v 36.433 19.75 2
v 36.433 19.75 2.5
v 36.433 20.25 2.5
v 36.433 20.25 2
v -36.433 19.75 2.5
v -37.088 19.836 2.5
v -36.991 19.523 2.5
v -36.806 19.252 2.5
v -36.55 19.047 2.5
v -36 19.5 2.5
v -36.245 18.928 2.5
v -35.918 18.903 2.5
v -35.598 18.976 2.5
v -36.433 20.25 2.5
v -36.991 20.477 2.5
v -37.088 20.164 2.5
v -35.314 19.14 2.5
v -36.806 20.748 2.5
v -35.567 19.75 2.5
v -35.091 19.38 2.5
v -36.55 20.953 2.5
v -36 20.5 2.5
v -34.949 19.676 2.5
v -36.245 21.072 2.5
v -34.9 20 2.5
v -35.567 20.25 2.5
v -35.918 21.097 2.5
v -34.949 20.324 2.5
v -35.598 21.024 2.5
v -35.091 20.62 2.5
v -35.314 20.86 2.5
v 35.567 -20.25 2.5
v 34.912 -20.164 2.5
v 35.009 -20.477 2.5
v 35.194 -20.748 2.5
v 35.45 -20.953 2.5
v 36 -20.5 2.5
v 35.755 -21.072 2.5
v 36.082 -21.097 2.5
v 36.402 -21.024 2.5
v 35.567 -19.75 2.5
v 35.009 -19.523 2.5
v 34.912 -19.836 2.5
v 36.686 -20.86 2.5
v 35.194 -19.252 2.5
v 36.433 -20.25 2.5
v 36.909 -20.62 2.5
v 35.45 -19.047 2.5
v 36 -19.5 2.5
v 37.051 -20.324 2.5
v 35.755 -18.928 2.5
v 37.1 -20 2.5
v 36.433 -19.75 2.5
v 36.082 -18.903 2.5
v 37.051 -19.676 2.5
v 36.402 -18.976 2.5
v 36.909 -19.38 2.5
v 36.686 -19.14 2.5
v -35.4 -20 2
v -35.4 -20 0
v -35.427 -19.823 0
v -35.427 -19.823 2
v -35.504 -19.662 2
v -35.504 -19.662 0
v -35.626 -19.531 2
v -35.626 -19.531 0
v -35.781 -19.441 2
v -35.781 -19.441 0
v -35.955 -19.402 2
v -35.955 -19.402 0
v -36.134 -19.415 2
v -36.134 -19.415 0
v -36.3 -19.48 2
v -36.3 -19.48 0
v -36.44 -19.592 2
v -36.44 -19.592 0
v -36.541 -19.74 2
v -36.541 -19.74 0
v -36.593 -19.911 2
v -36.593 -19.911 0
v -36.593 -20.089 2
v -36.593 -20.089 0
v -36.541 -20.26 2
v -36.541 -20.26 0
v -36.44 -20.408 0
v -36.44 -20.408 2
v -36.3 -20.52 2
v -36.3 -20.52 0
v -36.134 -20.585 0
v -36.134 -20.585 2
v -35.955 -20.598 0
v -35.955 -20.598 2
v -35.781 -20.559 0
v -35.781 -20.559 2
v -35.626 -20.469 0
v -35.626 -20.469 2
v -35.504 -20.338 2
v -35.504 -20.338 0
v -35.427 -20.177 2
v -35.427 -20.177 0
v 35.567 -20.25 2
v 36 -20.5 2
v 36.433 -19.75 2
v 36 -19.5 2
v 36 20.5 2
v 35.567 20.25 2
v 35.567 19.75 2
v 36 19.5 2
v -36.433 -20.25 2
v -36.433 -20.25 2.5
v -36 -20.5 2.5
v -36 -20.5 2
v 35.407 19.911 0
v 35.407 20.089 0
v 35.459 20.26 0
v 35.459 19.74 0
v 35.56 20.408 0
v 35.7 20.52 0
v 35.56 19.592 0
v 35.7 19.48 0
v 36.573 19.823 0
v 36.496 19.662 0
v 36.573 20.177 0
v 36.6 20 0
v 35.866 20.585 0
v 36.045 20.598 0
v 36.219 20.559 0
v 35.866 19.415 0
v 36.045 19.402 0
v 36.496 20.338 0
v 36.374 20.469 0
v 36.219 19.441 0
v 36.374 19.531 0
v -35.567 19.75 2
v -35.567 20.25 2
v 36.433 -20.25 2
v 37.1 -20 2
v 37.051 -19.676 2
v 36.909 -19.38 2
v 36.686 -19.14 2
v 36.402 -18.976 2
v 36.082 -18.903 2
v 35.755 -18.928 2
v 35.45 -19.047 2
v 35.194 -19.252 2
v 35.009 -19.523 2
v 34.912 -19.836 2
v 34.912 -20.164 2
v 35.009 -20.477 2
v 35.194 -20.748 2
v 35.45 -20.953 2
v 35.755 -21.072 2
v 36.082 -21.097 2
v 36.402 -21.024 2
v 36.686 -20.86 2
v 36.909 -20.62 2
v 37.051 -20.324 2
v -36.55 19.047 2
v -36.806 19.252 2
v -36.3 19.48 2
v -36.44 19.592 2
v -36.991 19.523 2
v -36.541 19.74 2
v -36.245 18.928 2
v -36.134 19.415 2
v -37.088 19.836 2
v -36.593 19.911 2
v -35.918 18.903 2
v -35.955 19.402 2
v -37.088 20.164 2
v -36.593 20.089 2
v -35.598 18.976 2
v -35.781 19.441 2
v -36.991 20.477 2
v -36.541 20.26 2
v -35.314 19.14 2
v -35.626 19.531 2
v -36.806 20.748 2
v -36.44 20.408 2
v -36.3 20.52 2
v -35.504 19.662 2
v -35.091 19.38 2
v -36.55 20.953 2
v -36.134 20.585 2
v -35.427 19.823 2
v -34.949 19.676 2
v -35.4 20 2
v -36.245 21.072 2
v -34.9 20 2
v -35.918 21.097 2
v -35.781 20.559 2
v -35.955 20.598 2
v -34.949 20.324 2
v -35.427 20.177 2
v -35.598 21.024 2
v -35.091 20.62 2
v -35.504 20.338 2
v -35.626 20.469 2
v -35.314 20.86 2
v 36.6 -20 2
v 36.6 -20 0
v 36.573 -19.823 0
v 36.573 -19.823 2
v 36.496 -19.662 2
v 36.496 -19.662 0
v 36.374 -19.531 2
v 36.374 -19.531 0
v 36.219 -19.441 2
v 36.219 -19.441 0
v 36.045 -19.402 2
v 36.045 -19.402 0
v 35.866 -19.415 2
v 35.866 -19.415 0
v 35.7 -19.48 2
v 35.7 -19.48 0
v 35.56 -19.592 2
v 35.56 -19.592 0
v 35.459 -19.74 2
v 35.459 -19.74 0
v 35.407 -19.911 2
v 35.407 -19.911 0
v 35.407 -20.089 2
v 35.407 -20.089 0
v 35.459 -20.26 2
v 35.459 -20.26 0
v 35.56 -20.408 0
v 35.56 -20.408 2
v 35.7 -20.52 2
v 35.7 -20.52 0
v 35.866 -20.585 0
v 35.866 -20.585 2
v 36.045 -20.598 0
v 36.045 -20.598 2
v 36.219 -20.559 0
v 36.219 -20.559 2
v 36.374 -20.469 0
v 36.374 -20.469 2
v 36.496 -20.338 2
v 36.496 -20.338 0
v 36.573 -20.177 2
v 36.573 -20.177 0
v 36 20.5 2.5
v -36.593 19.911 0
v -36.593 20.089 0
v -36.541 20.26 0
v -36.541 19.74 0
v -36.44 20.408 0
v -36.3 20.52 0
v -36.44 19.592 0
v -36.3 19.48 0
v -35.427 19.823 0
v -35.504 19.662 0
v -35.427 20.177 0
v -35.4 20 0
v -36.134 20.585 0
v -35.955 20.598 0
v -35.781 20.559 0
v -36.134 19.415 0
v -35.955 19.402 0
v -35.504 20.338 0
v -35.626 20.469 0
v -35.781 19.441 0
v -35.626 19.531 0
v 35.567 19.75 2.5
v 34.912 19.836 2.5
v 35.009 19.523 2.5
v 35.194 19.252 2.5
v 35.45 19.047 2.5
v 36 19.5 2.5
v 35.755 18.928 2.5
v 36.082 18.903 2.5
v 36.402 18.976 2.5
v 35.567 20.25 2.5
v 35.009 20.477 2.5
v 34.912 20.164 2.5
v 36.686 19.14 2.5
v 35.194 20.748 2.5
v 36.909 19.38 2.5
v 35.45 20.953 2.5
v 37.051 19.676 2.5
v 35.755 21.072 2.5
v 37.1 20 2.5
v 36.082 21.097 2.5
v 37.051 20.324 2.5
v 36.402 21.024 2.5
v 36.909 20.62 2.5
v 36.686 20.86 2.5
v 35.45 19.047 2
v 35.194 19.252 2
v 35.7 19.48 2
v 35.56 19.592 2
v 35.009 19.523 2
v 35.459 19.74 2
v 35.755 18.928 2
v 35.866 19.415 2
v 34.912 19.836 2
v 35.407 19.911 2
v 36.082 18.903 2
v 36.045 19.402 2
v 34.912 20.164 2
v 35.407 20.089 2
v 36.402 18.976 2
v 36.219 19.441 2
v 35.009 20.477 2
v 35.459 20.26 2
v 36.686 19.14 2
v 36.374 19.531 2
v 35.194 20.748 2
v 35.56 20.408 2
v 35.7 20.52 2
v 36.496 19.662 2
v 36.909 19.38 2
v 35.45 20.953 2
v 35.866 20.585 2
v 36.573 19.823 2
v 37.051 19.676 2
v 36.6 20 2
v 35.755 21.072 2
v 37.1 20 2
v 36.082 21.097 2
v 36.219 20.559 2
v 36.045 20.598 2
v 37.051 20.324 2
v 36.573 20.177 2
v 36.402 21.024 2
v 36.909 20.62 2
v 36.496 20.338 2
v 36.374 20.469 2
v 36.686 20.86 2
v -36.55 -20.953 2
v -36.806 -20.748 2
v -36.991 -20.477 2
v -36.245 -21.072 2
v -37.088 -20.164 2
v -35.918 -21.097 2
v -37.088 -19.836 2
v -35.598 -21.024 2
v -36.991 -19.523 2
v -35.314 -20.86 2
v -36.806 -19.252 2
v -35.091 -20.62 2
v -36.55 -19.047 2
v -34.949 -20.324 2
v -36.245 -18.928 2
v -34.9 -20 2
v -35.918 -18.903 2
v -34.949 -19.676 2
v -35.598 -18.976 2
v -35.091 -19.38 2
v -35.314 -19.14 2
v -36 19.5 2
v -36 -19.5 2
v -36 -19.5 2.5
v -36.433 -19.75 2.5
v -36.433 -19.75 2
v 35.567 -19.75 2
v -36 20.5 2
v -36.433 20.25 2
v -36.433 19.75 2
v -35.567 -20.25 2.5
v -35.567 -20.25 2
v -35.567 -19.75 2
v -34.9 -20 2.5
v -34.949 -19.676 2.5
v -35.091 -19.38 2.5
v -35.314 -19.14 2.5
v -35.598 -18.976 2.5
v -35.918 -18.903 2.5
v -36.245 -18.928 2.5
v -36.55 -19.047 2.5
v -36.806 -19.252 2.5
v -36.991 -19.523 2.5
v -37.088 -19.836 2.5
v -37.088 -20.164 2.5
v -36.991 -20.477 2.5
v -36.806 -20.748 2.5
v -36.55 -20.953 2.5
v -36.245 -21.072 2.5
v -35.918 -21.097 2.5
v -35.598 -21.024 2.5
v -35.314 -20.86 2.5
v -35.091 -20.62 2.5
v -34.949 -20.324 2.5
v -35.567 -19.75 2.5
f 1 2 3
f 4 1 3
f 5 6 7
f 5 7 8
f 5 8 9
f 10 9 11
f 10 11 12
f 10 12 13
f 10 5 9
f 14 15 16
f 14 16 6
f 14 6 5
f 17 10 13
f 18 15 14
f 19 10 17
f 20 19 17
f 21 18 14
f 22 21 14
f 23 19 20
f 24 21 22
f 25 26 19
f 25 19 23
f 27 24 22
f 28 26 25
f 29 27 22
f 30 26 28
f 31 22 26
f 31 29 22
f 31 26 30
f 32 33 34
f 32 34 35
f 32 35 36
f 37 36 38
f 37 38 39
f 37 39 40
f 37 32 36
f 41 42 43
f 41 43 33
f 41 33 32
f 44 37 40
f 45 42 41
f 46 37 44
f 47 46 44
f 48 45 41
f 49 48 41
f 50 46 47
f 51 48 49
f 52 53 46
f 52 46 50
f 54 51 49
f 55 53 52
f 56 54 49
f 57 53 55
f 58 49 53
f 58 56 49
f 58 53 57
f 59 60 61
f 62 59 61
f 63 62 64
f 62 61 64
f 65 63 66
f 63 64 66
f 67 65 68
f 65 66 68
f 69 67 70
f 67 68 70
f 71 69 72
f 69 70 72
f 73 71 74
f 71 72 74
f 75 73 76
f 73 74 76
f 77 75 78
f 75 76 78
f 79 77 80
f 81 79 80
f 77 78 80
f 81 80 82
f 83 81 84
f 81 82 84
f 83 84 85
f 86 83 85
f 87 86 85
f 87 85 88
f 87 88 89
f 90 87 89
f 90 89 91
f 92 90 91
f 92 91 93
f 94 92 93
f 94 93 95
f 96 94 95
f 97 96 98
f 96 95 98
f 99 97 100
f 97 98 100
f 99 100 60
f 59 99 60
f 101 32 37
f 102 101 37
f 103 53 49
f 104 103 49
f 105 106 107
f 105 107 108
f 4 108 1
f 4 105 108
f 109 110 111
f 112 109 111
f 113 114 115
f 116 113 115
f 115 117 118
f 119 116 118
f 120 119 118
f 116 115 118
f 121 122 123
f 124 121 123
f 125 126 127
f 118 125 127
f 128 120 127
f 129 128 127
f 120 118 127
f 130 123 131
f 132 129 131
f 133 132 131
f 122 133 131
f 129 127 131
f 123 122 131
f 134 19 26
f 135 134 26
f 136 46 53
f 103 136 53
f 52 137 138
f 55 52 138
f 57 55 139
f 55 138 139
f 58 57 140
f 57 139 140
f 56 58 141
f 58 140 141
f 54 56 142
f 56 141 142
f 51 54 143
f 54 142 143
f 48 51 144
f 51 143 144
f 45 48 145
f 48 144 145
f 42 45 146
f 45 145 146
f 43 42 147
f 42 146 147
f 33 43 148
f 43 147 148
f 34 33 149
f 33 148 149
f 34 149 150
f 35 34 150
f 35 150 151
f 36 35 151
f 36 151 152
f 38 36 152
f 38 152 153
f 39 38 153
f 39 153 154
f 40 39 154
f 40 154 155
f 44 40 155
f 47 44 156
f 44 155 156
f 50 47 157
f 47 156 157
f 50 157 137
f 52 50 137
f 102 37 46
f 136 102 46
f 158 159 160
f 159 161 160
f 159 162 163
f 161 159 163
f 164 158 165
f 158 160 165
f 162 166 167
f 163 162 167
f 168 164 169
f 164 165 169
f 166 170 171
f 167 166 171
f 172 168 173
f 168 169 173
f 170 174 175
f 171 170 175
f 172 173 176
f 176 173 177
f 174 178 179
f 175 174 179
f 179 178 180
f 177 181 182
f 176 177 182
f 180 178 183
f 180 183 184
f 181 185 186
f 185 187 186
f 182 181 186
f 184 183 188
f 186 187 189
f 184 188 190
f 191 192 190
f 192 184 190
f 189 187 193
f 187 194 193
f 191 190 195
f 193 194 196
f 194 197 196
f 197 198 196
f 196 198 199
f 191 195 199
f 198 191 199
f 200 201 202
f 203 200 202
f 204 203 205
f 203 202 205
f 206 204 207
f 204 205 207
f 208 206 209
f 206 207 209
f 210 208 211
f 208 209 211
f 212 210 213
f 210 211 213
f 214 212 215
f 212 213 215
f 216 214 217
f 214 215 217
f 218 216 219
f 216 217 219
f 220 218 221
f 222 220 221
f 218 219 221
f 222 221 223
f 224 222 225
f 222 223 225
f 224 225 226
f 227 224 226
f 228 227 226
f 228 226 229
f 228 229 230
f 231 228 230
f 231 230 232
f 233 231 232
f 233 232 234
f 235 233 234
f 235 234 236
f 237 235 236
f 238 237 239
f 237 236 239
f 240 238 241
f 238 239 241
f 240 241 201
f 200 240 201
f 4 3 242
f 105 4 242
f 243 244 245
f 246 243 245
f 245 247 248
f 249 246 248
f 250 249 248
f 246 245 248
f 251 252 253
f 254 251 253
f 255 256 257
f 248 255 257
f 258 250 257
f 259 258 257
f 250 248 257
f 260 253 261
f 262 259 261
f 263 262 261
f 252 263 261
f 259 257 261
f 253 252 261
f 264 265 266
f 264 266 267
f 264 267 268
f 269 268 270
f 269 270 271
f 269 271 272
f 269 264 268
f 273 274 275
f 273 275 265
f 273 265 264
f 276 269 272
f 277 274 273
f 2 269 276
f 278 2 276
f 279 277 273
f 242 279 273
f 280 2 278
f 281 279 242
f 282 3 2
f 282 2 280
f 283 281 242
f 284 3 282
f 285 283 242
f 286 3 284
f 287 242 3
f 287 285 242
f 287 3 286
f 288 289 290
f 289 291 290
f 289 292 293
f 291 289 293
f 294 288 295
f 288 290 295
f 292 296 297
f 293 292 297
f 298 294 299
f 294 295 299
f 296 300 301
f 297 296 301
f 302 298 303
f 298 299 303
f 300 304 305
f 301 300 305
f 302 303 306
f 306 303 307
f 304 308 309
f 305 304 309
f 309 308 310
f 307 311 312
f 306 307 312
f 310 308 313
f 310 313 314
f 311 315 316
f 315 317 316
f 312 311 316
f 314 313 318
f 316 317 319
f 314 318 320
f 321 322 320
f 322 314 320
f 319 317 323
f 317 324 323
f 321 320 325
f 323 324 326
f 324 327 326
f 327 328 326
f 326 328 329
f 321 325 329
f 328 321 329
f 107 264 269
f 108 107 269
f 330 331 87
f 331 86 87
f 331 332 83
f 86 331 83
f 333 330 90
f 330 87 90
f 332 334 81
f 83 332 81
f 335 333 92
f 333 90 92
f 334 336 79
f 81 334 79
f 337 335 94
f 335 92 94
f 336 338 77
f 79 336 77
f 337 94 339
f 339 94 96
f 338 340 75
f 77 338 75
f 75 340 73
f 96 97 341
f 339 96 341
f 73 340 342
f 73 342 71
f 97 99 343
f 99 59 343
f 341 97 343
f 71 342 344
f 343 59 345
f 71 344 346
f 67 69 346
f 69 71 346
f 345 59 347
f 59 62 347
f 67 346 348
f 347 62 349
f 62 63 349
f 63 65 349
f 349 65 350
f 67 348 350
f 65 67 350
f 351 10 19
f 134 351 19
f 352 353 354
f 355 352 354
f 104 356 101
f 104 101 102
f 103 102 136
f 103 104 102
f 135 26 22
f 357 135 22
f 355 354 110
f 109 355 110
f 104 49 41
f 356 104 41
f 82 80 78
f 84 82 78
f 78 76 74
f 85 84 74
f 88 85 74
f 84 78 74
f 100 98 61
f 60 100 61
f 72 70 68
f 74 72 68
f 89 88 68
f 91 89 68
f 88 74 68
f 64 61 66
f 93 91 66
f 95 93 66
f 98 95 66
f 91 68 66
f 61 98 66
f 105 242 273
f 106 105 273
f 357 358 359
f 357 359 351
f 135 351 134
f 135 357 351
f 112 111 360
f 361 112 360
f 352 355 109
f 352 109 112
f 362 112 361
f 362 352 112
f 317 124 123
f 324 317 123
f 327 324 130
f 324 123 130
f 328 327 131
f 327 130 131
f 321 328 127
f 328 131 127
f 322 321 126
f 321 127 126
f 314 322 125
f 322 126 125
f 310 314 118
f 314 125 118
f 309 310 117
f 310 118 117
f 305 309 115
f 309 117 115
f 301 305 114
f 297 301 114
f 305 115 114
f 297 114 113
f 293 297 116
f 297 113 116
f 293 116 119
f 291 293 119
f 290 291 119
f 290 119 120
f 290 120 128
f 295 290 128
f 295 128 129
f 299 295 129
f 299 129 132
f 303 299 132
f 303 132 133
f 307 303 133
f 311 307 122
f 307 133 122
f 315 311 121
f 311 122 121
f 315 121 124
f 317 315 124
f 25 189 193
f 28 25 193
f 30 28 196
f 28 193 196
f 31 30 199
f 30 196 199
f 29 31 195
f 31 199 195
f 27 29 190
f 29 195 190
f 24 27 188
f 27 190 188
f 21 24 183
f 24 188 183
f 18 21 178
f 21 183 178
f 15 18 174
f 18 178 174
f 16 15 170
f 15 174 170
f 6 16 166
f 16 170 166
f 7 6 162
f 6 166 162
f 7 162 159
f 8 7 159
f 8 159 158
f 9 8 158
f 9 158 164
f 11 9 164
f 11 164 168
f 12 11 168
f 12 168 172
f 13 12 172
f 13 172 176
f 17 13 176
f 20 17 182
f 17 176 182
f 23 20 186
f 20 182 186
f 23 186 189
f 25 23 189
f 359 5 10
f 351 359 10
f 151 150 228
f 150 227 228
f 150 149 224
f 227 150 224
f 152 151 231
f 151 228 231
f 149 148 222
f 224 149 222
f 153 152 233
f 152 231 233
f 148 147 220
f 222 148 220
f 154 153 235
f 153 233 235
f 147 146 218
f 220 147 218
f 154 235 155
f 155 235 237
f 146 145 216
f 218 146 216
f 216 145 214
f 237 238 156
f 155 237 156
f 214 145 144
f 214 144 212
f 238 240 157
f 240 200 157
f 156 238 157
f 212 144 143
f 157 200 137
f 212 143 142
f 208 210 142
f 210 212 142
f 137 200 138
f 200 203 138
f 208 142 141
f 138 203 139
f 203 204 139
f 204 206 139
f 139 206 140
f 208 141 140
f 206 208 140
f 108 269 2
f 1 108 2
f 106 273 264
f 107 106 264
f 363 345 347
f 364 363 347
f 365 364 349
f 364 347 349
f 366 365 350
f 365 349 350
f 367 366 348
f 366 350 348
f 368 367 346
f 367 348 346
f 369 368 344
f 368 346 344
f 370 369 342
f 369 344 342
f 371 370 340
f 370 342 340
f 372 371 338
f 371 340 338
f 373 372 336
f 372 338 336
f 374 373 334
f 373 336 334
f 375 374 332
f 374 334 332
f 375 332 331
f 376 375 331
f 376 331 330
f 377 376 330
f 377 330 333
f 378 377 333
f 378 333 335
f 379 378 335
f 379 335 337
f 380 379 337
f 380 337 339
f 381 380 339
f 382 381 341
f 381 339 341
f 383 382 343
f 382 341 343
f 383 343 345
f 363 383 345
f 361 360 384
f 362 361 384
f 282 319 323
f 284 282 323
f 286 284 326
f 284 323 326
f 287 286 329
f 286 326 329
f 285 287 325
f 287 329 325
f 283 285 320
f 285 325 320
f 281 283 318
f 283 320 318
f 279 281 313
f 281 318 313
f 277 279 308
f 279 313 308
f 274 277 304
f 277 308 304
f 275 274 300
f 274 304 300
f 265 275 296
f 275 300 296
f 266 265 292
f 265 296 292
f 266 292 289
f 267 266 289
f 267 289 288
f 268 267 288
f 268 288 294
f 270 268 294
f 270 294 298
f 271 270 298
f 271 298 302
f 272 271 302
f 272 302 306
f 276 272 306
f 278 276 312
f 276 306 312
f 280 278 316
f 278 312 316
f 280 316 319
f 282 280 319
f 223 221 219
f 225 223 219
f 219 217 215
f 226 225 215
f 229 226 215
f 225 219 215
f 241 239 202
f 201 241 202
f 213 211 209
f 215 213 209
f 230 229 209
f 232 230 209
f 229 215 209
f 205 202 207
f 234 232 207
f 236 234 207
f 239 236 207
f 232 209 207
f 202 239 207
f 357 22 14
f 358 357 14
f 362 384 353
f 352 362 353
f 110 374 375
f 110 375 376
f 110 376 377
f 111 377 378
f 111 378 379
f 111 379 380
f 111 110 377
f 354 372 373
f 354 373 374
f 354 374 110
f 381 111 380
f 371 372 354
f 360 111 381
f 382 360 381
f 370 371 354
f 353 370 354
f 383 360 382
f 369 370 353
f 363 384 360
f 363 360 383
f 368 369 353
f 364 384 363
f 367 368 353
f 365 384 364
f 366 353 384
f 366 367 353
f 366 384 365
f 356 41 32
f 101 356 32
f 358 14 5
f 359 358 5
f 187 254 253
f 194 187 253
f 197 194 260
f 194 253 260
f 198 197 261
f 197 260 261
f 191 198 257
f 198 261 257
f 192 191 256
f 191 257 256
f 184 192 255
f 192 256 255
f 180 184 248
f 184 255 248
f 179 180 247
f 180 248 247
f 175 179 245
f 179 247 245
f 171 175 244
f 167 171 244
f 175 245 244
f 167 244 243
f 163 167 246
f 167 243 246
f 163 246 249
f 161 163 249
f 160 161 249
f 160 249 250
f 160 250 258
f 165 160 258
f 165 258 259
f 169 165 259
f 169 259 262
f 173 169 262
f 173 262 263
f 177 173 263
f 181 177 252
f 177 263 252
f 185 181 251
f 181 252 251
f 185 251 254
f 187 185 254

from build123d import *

# Parameters (mm, degrees)
SKETCH_1_R          = 0.6
EXTRUDE_1_DEPTH     = 2
EXTRUDE_1_2_DEPTH   = 2
EXTRUDE_1_3_DEPTH   = 2
EXTRUDE_1_4_DEPTH   = 2
SKETCH_2_R          = 1.1
EXTRUDE_2_DEPTH     = 0.5
CUT_EXTRUDE_1_DEPTH = 0.5


with BuildPart() as part:
    # Эскиз1 → Бобышка-Вытянуть1 (new body)
    with BuildSketch(Plane.XY):
        with Locations((-36, 20)):
            Circle(SKETCH_1_R)
    extrude(amount=EXTRUDE_1_DEPTH)



with BuildPart() as body_2:
    # Эскиз1 → Extrude 1 2 (new body)
    with BuildSketch(Plane.XY):
        with Locations((36, 20)):
            Circle(SKETCH_1_R)
    extrude(amount=EXTRUDE_1_2_DEPTH)


with BuildPart() as body_3:
    # Эскиз1 → Extrude 1 3 (new body)
    with BuildSketch(Plane.XY):
        with Locations((36, -20)):
            Circle(SKETCH_1_R)
    extrude(amount=EXTRUDE_1_3_DEPTH)


with BuildPart() as body_4:
    # Эскиз1 → Extrude 1 4 (new body)
    with BuildSketch(Plane.XY):
        with Locations((-36, -20)):
            Circle(SKETCH_1_R)
    extrude(amount=EXTRUDE_1_4_DEPTH)


with BuildPart() as part_1:
    add(part.part)

    add(body_2.part)  # Бобышка-Вытянуть2 merges body 2

    add(body_3.part)  # Бобышка-Вытянуть2 merges body 3

    add(body_4.part)  # Бобышка-Вытянуть2 merges body 4
    # Эскиз2 → Бобышка-Вытянуть2 (add)
    with BuildSketch(Plane.XY.offset(2)):
        with Locations((-36, 20)):
            Circle(SKETCH_2_R)
        with Locations((36, 20)):
            Circle(SKETCH_2_R)
        with Locations((36, -20)):
            Circle(SKETCH_2_R)
        with Locations((-36, -20)):
            Circle(SKETCH_2_R)
    extrude(amount=EXTRUDE_2_DEPTH)

    # Эскиз3 → Вырез-Вытянуть1 (cut)
    with BuildSketch(Plane.XY.offset(2.5)):
        Polygon((36.433012702, -20.25), (36.433012702, -19.75), (36, -19.5), (35.566987298, -19.75), (35.566987298, -20.25), (36, -20.5), align=None)
        Polygon((36.433012702, 19.75), (36.433012702, 20.25), (36, 20.5), (35.566987298, 20.25), (35.566987298, 19.75), (36, 19.5), align=None)
        Polygon((-35.566987298, 19.75), (-35.566987298, 20.25), (-36, 20.5), (-36.433012702, 20.25), (-36.433012702, 19.75), (-36, 19.5), align=None)
        Polygon((-35.566987298, -20.25), (-35.566987298, -19.75), (-36, -19.5), (-36.433012702, -19.75), (-36.433012702, -20.25), (-36, -20.5), align=None)
    extrude(amount=-CUT_EXTRUDE_1_DEPTH, mode=Mode.SUBTRACT)


solid = part_1.part
